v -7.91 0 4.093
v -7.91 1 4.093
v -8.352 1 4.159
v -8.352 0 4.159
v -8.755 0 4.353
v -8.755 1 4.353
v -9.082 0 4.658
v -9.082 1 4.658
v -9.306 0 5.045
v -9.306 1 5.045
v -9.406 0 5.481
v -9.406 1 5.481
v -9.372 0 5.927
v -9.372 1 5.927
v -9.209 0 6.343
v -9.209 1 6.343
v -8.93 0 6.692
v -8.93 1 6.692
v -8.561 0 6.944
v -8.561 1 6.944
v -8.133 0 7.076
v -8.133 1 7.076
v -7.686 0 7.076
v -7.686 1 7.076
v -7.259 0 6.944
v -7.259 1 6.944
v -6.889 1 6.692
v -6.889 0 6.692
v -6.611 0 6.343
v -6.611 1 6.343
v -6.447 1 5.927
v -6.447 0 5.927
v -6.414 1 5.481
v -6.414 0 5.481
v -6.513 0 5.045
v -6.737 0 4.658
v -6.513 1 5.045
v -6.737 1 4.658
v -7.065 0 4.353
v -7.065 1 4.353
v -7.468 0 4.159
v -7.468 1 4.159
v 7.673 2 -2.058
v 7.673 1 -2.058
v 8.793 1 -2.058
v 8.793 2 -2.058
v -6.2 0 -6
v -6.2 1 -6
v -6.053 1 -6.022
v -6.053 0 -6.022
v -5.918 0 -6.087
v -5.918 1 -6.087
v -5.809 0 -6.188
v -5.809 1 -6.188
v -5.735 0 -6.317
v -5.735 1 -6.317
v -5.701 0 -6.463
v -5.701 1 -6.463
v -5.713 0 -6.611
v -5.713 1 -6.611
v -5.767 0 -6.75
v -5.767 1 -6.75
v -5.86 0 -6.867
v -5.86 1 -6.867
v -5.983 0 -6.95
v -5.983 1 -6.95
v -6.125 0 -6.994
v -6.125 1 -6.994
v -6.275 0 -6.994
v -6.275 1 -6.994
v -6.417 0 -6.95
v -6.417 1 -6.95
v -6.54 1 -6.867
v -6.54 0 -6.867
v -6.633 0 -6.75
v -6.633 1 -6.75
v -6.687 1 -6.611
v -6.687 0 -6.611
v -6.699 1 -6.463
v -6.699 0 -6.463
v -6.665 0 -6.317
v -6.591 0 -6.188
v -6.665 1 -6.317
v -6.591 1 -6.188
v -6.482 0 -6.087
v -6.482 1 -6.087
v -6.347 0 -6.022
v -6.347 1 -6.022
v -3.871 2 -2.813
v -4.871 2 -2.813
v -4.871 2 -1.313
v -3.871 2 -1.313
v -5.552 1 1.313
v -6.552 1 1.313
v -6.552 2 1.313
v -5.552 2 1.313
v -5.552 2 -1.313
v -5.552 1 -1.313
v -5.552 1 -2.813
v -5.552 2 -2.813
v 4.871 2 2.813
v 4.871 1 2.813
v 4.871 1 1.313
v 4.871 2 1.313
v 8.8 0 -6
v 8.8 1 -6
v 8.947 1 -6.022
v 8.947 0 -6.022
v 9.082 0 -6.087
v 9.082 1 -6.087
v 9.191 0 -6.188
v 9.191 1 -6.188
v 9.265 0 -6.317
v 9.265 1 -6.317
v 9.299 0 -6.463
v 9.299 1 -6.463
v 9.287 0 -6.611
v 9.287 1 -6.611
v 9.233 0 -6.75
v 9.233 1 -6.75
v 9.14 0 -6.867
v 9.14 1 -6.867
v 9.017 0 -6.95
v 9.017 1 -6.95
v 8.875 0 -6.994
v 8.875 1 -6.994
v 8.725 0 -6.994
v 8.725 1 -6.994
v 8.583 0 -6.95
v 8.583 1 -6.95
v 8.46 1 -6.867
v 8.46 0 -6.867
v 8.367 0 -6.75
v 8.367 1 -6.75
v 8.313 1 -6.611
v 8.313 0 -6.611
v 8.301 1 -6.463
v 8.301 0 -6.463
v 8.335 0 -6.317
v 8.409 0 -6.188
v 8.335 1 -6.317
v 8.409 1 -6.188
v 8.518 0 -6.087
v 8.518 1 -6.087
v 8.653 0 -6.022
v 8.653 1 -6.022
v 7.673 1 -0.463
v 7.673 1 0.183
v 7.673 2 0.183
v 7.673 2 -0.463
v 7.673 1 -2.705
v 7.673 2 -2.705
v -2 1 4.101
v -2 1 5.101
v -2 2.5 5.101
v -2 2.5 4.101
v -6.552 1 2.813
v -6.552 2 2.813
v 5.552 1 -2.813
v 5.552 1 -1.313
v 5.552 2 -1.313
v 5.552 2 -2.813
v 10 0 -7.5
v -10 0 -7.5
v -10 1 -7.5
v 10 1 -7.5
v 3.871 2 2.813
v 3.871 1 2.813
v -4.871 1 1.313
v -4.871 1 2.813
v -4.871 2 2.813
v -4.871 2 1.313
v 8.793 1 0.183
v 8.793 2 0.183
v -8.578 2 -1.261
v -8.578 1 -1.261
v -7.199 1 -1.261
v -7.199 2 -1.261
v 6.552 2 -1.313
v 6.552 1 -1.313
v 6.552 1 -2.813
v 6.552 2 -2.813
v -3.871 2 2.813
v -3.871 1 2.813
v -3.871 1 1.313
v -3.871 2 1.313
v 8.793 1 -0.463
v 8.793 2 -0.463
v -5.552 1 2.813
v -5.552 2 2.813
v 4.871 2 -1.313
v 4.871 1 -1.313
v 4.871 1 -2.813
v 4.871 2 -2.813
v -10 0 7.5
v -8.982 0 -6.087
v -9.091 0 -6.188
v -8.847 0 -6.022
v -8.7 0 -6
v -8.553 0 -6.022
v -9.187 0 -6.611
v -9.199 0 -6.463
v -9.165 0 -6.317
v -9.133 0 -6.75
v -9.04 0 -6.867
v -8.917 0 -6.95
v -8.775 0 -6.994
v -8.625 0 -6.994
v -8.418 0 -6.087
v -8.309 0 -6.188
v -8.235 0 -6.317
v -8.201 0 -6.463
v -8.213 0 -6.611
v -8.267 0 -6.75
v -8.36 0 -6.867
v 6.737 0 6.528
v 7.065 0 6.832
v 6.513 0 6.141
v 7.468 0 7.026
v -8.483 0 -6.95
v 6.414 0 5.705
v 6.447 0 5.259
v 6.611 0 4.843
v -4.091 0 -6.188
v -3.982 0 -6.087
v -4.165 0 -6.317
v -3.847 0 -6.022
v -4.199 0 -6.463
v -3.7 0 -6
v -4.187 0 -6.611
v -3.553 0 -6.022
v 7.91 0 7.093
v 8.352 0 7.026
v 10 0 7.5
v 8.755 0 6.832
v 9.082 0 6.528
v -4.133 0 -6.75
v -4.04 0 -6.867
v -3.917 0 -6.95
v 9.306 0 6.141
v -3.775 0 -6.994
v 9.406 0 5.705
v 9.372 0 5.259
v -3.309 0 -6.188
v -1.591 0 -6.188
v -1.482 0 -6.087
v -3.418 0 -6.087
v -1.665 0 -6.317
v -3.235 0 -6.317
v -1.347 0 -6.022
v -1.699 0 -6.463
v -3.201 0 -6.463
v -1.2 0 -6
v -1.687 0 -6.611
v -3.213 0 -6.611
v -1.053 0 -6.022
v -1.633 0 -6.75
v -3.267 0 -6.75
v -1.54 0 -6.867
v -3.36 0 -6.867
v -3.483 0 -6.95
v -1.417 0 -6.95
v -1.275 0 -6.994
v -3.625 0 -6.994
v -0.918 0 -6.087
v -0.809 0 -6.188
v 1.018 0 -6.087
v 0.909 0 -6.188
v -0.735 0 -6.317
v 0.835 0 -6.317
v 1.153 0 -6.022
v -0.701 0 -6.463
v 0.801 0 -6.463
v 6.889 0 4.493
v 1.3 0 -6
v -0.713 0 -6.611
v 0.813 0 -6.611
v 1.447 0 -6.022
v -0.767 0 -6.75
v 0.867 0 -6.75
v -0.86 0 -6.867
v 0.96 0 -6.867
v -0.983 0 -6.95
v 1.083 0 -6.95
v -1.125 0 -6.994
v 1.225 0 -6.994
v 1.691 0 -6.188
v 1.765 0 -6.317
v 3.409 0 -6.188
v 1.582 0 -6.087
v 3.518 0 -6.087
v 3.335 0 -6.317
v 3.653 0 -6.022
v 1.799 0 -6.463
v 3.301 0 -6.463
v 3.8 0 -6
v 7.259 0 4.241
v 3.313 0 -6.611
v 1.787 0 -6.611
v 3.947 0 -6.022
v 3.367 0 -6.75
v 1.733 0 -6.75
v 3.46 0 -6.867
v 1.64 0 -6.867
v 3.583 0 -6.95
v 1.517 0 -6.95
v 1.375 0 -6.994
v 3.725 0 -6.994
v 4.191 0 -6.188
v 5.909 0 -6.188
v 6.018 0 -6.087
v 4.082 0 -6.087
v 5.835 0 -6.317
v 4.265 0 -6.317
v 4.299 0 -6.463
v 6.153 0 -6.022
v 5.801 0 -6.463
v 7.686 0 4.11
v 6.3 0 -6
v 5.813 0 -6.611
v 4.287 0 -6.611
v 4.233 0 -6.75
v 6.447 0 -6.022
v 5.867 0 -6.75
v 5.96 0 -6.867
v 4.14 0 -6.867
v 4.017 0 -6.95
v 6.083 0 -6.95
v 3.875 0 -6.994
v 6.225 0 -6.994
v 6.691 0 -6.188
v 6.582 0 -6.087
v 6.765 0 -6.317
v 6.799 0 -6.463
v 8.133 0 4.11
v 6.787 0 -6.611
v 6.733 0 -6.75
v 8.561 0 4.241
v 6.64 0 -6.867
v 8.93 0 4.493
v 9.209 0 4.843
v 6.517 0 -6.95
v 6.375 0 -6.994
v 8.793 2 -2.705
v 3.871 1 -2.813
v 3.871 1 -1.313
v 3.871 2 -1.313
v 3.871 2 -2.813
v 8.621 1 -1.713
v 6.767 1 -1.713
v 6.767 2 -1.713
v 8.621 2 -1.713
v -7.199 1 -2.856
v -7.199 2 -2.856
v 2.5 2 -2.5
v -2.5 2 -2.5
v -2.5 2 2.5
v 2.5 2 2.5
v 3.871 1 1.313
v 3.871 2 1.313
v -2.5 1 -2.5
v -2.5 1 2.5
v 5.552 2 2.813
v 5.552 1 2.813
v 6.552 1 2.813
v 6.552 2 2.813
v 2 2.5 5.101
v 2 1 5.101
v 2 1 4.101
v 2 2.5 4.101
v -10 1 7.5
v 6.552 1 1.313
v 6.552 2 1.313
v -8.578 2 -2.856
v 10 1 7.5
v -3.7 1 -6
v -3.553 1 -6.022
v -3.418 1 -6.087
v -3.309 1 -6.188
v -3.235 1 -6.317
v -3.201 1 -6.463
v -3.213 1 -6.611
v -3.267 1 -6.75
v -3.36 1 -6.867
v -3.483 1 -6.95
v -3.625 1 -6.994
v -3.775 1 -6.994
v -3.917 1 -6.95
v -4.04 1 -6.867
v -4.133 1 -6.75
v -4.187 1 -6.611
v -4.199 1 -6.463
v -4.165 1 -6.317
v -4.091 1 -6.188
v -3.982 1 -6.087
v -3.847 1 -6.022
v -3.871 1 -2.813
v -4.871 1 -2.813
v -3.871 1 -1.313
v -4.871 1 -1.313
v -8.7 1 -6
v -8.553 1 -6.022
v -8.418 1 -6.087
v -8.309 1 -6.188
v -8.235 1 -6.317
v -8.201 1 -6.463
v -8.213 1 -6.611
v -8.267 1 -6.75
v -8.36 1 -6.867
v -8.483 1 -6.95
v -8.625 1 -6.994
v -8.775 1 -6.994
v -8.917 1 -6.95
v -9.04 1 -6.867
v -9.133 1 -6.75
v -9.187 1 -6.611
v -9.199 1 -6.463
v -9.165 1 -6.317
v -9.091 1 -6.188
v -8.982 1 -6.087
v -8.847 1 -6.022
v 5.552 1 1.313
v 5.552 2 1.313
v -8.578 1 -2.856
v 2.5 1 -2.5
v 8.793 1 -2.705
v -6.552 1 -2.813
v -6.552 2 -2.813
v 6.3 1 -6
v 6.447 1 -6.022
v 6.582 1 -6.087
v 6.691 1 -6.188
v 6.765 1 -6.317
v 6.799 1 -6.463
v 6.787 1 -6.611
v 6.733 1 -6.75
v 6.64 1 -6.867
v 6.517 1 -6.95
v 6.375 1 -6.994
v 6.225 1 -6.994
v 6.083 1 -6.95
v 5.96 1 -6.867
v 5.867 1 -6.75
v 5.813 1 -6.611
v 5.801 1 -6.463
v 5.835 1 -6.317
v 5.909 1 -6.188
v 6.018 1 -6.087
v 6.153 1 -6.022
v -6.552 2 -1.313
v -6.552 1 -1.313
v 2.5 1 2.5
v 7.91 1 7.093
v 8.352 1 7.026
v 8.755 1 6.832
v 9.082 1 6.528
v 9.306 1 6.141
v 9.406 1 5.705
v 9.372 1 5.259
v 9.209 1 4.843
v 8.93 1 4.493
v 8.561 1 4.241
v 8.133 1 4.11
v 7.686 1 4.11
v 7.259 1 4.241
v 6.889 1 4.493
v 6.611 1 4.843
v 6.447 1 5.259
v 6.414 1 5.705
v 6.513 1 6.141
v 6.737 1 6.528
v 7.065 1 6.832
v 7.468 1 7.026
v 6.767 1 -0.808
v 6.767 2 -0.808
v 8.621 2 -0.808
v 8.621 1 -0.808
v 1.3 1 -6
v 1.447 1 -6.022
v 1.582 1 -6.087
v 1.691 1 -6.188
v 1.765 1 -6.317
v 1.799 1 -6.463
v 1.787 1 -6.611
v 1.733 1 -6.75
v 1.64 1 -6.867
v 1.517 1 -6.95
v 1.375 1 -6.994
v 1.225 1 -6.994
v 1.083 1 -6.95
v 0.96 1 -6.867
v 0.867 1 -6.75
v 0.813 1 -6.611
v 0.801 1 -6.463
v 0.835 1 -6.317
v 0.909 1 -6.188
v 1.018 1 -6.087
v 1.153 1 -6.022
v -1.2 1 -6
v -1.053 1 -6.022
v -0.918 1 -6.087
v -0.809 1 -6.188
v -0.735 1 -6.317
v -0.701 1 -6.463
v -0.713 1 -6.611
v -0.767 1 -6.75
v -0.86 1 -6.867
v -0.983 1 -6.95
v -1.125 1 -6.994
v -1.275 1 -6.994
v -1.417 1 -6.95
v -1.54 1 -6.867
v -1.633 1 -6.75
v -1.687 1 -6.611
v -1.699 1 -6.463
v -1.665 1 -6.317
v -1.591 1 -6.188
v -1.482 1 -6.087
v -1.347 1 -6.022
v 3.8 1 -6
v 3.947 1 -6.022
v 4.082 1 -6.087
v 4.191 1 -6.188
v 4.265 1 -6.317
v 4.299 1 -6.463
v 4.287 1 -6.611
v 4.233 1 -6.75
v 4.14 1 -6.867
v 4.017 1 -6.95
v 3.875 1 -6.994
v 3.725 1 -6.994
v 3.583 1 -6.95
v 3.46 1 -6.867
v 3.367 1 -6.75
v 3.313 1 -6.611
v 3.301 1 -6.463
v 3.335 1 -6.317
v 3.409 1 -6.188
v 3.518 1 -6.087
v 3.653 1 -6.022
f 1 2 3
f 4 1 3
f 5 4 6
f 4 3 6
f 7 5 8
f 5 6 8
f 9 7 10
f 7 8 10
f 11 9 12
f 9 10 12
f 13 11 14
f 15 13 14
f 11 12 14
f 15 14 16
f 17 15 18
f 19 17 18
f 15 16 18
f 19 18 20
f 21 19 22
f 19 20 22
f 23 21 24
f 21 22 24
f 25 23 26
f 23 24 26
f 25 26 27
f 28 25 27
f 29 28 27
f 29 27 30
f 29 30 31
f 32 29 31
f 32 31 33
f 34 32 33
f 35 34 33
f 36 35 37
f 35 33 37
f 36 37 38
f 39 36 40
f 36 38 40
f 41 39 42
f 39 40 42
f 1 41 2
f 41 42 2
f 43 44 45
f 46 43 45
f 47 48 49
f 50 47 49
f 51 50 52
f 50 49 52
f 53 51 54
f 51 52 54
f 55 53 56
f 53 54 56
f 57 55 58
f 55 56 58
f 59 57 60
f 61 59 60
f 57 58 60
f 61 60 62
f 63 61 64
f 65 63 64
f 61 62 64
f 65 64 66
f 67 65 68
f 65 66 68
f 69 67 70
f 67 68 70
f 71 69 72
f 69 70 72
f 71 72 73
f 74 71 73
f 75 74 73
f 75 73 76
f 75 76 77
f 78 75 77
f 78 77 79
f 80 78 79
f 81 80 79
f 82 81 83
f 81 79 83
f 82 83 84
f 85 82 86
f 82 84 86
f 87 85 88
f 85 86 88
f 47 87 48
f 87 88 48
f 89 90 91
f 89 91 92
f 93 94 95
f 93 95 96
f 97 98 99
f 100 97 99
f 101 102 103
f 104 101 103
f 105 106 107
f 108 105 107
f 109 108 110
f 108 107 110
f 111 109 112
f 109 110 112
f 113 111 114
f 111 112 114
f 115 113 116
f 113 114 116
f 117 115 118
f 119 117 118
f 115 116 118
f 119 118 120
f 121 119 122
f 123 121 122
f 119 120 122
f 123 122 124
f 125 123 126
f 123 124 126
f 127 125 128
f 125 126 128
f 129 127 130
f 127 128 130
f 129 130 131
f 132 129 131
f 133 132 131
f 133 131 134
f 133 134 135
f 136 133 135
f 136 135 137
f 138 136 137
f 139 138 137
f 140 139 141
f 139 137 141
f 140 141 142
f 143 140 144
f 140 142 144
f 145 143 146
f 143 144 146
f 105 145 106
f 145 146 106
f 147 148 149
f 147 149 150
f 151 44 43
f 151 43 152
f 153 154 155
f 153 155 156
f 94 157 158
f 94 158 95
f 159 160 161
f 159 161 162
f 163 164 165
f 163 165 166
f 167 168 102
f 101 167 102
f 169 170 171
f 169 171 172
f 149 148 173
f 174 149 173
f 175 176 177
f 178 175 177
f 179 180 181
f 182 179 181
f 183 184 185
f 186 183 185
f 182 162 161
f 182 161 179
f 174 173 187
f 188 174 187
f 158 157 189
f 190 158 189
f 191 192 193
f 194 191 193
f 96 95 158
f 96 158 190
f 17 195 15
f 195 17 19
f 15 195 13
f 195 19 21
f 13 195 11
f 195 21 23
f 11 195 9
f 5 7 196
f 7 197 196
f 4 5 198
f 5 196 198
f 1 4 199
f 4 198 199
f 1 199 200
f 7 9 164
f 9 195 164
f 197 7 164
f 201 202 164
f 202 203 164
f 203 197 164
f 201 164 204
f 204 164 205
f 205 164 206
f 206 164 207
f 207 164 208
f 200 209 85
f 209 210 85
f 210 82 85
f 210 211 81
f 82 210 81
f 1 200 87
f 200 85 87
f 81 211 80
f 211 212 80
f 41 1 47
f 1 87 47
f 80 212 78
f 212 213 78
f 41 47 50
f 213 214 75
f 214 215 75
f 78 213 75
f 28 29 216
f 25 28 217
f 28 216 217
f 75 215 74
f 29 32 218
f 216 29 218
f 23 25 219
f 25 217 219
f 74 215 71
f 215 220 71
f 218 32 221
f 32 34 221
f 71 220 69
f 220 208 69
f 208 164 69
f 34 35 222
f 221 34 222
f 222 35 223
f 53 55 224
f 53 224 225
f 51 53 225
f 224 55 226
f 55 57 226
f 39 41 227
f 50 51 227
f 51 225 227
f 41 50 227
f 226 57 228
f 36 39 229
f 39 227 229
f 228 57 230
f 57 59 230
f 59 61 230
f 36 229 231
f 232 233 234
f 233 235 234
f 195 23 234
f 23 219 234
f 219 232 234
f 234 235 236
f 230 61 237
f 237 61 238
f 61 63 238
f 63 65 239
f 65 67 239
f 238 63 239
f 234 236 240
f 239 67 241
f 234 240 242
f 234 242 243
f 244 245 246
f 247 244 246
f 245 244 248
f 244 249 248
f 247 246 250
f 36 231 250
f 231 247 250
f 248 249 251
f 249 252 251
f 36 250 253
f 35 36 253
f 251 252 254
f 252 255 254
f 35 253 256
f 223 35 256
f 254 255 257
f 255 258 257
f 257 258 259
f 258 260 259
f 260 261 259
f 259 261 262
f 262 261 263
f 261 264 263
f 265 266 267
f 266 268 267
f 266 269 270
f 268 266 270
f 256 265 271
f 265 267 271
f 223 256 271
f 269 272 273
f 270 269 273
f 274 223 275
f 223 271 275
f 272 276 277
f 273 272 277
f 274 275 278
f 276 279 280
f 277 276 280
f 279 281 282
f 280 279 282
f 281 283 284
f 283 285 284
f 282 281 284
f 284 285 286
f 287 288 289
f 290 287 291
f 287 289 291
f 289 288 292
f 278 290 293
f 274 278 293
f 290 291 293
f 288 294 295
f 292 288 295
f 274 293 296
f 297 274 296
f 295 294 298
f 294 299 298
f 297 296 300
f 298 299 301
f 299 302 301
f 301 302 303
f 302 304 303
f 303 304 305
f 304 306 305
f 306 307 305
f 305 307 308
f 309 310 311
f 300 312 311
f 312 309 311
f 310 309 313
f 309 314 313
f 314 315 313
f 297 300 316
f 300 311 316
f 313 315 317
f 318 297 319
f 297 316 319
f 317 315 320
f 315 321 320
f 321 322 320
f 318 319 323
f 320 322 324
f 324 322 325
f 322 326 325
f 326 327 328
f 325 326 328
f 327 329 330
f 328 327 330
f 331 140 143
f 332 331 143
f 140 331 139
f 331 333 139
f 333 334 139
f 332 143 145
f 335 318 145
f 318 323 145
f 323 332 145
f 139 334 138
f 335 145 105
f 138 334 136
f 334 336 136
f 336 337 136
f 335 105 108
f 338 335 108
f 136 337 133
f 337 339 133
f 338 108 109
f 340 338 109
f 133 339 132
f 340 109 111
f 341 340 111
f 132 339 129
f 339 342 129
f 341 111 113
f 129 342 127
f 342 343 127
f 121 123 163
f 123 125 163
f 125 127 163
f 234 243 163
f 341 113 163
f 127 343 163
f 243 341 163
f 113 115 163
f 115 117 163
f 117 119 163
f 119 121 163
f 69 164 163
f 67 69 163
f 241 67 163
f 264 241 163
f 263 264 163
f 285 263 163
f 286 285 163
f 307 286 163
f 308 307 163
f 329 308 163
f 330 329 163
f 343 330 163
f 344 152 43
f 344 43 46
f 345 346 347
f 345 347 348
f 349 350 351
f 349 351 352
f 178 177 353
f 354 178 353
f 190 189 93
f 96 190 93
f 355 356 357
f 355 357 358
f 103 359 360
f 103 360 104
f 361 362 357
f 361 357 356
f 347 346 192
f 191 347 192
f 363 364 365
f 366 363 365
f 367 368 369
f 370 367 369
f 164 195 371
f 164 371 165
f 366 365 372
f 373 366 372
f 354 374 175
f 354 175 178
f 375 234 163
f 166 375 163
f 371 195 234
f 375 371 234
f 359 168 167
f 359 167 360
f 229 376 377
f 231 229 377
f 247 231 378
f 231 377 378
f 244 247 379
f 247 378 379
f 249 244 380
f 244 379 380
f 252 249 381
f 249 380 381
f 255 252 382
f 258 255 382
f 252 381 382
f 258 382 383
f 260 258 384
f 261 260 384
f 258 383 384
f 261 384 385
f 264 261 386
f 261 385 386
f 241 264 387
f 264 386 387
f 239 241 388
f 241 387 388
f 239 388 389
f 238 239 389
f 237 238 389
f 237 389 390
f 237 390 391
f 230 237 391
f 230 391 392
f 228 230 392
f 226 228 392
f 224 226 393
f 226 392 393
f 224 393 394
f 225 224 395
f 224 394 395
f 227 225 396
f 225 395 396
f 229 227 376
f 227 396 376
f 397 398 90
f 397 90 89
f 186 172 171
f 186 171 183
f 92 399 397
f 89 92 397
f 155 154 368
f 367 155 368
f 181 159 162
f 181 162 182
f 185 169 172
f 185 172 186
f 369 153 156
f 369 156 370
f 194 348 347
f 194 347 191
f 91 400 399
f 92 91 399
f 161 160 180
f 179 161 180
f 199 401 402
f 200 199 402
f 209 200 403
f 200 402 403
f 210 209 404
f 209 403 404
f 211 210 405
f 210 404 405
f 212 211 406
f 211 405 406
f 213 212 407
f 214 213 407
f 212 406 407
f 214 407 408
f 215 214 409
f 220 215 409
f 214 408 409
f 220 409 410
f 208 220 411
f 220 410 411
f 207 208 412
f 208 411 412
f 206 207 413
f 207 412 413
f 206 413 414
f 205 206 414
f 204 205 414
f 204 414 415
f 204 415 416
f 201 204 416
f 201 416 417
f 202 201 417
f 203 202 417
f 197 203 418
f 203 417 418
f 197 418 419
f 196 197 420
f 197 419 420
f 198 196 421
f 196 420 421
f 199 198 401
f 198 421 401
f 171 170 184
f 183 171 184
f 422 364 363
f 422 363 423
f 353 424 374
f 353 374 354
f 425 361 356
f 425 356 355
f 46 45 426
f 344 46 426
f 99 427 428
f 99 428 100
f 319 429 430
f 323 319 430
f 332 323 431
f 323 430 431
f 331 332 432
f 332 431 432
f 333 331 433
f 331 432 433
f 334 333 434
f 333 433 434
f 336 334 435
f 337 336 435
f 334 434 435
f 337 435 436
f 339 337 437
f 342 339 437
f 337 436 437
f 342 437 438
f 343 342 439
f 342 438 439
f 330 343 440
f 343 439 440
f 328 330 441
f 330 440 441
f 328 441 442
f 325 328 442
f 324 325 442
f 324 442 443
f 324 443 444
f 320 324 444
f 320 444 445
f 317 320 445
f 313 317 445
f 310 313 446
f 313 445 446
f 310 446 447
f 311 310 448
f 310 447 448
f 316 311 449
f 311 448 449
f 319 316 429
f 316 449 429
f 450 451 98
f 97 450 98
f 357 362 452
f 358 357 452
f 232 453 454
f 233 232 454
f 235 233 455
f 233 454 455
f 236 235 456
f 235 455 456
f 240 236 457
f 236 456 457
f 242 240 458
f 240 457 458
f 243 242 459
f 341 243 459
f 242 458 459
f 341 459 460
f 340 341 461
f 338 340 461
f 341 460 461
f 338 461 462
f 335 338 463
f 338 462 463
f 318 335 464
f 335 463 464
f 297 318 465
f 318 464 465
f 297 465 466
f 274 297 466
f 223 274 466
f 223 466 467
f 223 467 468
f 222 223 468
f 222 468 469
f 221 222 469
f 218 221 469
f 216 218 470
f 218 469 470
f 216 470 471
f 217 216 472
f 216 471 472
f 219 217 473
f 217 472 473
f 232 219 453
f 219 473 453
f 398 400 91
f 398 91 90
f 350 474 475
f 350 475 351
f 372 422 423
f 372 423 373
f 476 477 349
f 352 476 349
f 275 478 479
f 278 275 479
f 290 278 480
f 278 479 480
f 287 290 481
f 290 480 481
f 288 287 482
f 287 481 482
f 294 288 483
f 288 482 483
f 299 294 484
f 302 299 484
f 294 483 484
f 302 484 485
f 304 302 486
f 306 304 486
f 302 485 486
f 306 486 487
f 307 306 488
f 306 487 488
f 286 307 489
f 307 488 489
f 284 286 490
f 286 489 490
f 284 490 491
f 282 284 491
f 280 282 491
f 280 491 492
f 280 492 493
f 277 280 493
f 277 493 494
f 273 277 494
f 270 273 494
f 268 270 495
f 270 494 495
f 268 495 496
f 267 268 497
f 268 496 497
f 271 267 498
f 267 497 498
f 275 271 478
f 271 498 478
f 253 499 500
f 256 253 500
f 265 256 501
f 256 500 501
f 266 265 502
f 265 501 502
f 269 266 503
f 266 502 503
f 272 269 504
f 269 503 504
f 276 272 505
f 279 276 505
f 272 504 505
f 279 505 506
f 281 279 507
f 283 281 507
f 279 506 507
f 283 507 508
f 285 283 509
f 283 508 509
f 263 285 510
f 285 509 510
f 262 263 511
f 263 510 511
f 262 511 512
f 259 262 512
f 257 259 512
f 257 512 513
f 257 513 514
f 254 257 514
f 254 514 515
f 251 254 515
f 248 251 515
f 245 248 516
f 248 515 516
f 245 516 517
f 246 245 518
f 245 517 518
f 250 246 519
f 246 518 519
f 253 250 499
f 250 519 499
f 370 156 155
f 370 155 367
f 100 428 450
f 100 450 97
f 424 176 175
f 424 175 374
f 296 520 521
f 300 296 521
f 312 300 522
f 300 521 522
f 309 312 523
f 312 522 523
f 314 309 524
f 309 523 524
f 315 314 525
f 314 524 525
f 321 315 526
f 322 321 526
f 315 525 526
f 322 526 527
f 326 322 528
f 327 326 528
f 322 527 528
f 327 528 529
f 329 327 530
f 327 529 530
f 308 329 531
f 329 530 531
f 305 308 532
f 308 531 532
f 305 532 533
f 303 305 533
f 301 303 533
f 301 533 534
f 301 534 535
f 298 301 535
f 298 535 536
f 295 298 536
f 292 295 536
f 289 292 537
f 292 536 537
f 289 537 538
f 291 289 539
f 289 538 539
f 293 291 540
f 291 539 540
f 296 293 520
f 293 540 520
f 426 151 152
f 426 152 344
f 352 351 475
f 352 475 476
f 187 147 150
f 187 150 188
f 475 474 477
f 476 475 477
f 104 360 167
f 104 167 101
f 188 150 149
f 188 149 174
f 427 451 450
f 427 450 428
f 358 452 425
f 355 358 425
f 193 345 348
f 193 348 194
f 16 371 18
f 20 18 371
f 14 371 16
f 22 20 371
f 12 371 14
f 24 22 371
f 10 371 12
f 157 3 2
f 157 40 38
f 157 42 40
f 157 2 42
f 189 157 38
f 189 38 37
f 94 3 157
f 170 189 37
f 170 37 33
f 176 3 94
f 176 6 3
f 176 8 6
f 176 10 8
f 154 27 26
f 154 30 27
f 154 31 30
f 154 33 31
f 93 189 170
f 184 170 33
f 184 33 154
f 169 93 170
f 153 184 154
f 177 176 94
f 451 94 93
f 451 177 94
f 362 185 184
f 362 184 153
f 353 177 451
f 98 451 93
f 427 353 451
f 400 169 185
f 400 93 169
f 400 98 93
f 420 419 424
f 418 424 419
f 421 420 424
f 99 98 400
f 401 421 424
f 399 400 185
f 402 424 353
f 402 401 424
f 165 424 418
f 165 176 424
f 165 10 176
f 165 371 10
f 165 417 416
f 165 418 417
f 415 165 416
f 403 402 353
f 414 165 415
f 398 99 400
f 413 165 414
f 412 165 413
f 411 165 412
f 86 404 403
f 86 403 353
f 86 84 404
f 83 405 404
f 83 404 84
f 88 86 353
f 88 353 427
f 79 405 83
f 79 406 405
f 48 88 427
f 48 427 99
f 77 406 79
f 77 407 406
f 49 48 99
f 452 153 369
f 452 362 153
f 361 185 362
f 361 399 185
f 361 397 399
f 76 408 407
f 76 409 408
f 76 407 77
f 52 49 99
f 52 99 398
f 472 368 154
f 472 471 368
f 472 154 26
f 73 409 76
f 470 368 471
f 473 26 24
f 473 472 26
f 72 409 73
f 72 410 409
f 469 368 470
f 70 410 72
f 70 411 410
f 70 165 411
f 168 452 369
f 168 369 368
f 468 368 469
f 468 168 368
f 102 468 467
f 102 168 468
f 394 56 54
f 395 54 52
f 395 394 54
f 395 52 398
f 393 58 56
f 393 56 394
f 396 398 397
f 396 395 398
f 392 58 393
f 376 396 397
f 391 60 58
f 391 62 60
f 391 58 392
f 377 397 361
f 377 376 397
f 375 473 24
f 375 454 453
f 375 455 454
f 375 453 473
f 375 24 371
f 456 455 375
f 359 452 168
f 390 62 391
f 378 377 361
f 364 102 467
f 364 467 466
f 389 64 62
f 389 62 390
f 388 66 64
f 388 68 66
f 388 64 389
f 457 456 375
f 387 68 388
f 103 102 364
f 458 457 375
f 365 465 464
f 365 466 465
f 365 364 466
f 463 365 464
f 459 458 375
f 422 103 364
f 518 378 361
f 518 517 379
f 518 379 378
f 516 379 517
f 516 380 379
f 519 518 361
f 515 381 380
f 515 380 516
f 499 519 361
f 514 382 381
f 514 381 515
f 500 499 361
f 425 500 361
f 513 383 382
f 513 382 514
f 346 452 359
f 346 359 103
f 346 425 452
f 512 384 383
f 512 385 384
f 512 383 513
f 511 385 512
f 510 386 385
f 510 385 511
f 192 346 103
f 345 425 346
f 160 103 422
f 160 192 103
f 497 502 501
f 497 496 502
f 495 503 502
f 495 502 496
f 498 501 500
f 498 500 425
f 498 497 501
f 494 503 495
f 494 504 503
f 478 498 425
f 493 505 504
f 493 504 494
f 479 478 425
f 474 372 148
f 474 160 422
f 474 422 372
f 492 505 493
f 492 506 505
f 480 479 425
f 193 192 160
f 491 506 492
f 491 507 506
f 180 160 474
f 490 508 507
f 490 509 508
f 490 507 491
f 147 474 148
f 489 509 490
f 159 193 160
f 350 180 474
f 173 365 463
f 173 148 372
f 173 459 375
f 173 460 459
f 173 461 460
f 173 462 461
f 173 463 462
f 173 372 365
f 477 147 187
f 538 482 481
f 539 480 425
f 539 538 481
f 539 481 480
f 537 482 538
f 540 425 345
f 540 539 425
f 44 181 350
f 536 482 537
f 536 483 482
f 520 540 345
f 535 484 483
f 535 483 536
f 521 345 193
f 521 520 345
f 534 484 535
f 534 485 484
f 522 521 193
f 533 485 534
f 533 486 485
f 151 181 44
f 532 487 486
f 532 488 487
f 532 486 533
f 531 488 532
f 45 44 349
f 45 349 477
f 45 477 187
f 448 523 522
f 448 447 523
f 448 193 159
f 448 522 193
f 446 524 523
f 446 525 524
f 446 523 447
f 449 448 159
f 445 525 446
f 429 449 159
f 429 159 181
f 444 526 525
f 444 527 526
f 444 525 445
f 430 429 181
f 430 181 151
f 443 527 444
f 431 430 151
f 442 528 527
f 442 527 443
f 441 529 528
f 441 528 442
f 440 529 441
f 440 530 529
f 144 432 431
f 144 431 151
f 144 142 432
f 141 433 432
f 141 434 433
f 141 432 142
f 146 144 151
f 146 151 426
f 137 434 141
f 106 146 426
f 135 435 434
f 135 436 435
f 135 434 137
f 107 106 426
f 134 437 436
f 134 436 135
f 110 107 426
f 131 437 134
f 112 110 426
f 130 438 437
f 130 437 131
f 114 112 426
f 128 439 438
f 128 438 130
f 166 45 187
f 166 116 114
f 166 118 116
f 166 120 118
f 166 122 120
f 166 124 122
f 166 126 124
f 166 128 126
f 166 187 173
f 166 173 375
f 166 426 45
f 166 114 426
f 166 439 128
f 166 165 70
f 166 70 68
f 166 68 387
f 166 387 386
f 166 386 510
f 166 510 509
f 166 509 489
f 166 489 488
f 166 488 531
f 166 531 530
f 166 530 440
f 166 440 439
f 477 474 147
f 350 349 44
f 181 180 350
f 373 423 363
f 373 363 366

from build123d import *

# Parameters (mm, degrees)
SKETCH1_W           = 20
SKETCH1_H           = 15
BOSS_EXTRUDE1_DEPTH = 1
SKETCH2_R           = 0.5
CUT_EXTRUDE1_DEPTH  = 1
SKETCH3_R           = 1.5
CUT_EXTRUDE2_DEPTH  = 1
SKETCH4_W           = 5
SKETCH4_H           = 5
BOSS_EXTRUDE2_DEPTH = 1
SKETCH5_W           = 4
SKETCH5_H           = 1
BOSS_EXTRUDE3_DEPTH = 1.5
SKETCH6_W           = 1
SKETCH6_H           = 1.5
BOSS_EXTRUDE4_DEPTH = 1
SKETCH7_W           = 1.379354472
SKETCH7_H           = 1.594878607
SKETCH7_W_2         = 1.853507571
SKETCH7_H_2         = 0.905201372
SKETCH7_W_3         = 1.120725508
SKETCH7_H_3         = 0.646572409
BOSS_EXTRUDE5_DEPTH = 1


with BuildPart() as part:
    # Sketch1 → Boss-Extrude1 (new body)
    with BuildSketch(Plane(origin=(0, 0, 0), x_dir=(1, 0, 0), z_dir=(0, 1, 0))):
        Rectangle(SKETCH1_W, SKETCH1_H)
    extrude(amount=BOSS_EXTRUDE1_DEPTH)

    # Sketch2 → Cut-Extrude1 (cut)
    with BuildSketch(Plane(origin=(0, 1, 0), x_dir=(1, 0, 0), z_dir=(0, 1, 0))):
        with Locations(Location((8.8, 6.5, 0), (0, 0, 270))):
            Circle(SKETCH2_R)
        with Locations(Location((6.3, 6.5, 0), (0, 0, 270))):
            Circle(SKETCH2_R)
        with Locations(Location((3.8, 6.5, 0), (0, 0, 270))):
            Circle(SKETCH2_R)
        with Locations(Location((1.3, 6.5, 0), (0, 0, 270))):
            Circle(SKETCH2_R)
        with Locations(Location((-1.2, 6.5, 0), (0, 0, 270))):
            Circle(SKETCH2_R)
        with Locations(Location((-3.7, 6.5, 0), (0, 0, 270))):
            Circle(SKETCH2_R)
        with Locations(Location((-6.2, 6.5, 0), (0, 0, 270))):
            Circle(SKETCH2_R)
        with Locations(Location((-8.7, 6.5, 0), (0, 0, 270))):
            Circle(SKETCH2_R)
    extrude(amount=-CUT_EXTRUDE1_DEPTH, mode=Mode.SUBTRACT)

    # Sketch3 → Cut-Extrude2 (cut)
    with BuildSketch(Plane(origin=(0, 1, 0), x_dir=(1, 0, 0), z_dir=(0, 1, 0))):
        with Locations(Location((7.909735798, -5.592851334, 0), (0, 0, 270))):
            Circle(SKETCH3_R)
        with Locations(Location((-7.909735798, -5.592851334, 0), (0, 0, 90))):
            Circle(SKETCH3_R)
    extrude(amount=-CUT_EXTRUDE2_DEPTH, mode=Mode.SUBTRACT)

    # Sketch4 → Boss-Extrude2 (add)
    with BuildSketch(Plane(origin=(0, 1, 0), x_dir=(1, 0, 0), z_dir=(0, 1, 0))):
        Rectangle(SKETCH4_W, SKETCH4_H)
    extrude(amount=BOSS_EXTRUDE2_DEPTH)

    # Sketch5 → Boss-Extrude3 (add)
    with BuildSketch(Plane(origin=(0, 1, 0), x_dir=(1, 0, 0), z_dir=(0, 1, 0))):
        with Locations((0, -4.601440307)):
            Rectangle(SKETCH5_W, SKETCH5_H)
    extrude(amount=BOSS_EXTRUDE3_DEPTH)

    # Sketch6 → Boss-Extrude4 (add)
    with BuildSketch(Plane(origin=(0, 1, 0), x_dir=(1, 0, 0), z_dir=(0, 1, 0))):
        with Locations((-6.05193374, 2.062589977)):
            Rectangle(SKETCH6_W, SKETCH6_H)
        with Locations((-4.370845478, 2.062589977)):
            Rectangle(SKETCH6_W, SKETCH6_H)
        with Locations((-6.05193374, -2.062589977)):
            Rectangle(SKETCH6_W, SKETCH6_H)
        with Locations((-4.370845478, -2.062589977)):
            Rectangle(SKETCH6_W, SKETCH6_H)
        with Locations((4.370845478, -2.062589977)):
            Rectangle(SKETCH6_W, SKETCH6_H)
        with Locations((6.05193374, -2.062589977)):
            Rectangle(SKETCH6_W, SKETCH6_H)
        with Locations((4.370845478, 2.062589977)):
            Rectangle(SKETCH6_W, SKETCH6_H)
        with Locations((6.05193374, 2.062589977)):
            Rectangle(SKETCH6_W, SKETCH6_H)
    extrude(amount=BOSS_EXTRUDE4_DEPTH)

    # Sketch7 → Boss-Extrude5 (add)
    with BuildSketch(Plane(origin=(0, 1, 0), x_dir=(1, 0, 0), z_dir=(0, 1, 0))):
        with Locations((-7.888183384, 2.058255501)):
            Rectangle(SKETCH7_W, SKETCH7_H)
        with Locations((7.694211662, 1.260816197)):
            Rectangle(SKETCH7_W_2, SKETCH7_H_2)
        with Locations((8.233022002, 2.381541705)):
            Rectangle(SKETCH7_W_3, SKETCH7_H_3)
        with Locations((8.233022002, 0.140090689)):
            Rectangle(SKETCH7_W_3, SKETCH7_H_3)
    extrude(amount=BOSS_EXTRUDE5_DEPTH)


solid = part.part
